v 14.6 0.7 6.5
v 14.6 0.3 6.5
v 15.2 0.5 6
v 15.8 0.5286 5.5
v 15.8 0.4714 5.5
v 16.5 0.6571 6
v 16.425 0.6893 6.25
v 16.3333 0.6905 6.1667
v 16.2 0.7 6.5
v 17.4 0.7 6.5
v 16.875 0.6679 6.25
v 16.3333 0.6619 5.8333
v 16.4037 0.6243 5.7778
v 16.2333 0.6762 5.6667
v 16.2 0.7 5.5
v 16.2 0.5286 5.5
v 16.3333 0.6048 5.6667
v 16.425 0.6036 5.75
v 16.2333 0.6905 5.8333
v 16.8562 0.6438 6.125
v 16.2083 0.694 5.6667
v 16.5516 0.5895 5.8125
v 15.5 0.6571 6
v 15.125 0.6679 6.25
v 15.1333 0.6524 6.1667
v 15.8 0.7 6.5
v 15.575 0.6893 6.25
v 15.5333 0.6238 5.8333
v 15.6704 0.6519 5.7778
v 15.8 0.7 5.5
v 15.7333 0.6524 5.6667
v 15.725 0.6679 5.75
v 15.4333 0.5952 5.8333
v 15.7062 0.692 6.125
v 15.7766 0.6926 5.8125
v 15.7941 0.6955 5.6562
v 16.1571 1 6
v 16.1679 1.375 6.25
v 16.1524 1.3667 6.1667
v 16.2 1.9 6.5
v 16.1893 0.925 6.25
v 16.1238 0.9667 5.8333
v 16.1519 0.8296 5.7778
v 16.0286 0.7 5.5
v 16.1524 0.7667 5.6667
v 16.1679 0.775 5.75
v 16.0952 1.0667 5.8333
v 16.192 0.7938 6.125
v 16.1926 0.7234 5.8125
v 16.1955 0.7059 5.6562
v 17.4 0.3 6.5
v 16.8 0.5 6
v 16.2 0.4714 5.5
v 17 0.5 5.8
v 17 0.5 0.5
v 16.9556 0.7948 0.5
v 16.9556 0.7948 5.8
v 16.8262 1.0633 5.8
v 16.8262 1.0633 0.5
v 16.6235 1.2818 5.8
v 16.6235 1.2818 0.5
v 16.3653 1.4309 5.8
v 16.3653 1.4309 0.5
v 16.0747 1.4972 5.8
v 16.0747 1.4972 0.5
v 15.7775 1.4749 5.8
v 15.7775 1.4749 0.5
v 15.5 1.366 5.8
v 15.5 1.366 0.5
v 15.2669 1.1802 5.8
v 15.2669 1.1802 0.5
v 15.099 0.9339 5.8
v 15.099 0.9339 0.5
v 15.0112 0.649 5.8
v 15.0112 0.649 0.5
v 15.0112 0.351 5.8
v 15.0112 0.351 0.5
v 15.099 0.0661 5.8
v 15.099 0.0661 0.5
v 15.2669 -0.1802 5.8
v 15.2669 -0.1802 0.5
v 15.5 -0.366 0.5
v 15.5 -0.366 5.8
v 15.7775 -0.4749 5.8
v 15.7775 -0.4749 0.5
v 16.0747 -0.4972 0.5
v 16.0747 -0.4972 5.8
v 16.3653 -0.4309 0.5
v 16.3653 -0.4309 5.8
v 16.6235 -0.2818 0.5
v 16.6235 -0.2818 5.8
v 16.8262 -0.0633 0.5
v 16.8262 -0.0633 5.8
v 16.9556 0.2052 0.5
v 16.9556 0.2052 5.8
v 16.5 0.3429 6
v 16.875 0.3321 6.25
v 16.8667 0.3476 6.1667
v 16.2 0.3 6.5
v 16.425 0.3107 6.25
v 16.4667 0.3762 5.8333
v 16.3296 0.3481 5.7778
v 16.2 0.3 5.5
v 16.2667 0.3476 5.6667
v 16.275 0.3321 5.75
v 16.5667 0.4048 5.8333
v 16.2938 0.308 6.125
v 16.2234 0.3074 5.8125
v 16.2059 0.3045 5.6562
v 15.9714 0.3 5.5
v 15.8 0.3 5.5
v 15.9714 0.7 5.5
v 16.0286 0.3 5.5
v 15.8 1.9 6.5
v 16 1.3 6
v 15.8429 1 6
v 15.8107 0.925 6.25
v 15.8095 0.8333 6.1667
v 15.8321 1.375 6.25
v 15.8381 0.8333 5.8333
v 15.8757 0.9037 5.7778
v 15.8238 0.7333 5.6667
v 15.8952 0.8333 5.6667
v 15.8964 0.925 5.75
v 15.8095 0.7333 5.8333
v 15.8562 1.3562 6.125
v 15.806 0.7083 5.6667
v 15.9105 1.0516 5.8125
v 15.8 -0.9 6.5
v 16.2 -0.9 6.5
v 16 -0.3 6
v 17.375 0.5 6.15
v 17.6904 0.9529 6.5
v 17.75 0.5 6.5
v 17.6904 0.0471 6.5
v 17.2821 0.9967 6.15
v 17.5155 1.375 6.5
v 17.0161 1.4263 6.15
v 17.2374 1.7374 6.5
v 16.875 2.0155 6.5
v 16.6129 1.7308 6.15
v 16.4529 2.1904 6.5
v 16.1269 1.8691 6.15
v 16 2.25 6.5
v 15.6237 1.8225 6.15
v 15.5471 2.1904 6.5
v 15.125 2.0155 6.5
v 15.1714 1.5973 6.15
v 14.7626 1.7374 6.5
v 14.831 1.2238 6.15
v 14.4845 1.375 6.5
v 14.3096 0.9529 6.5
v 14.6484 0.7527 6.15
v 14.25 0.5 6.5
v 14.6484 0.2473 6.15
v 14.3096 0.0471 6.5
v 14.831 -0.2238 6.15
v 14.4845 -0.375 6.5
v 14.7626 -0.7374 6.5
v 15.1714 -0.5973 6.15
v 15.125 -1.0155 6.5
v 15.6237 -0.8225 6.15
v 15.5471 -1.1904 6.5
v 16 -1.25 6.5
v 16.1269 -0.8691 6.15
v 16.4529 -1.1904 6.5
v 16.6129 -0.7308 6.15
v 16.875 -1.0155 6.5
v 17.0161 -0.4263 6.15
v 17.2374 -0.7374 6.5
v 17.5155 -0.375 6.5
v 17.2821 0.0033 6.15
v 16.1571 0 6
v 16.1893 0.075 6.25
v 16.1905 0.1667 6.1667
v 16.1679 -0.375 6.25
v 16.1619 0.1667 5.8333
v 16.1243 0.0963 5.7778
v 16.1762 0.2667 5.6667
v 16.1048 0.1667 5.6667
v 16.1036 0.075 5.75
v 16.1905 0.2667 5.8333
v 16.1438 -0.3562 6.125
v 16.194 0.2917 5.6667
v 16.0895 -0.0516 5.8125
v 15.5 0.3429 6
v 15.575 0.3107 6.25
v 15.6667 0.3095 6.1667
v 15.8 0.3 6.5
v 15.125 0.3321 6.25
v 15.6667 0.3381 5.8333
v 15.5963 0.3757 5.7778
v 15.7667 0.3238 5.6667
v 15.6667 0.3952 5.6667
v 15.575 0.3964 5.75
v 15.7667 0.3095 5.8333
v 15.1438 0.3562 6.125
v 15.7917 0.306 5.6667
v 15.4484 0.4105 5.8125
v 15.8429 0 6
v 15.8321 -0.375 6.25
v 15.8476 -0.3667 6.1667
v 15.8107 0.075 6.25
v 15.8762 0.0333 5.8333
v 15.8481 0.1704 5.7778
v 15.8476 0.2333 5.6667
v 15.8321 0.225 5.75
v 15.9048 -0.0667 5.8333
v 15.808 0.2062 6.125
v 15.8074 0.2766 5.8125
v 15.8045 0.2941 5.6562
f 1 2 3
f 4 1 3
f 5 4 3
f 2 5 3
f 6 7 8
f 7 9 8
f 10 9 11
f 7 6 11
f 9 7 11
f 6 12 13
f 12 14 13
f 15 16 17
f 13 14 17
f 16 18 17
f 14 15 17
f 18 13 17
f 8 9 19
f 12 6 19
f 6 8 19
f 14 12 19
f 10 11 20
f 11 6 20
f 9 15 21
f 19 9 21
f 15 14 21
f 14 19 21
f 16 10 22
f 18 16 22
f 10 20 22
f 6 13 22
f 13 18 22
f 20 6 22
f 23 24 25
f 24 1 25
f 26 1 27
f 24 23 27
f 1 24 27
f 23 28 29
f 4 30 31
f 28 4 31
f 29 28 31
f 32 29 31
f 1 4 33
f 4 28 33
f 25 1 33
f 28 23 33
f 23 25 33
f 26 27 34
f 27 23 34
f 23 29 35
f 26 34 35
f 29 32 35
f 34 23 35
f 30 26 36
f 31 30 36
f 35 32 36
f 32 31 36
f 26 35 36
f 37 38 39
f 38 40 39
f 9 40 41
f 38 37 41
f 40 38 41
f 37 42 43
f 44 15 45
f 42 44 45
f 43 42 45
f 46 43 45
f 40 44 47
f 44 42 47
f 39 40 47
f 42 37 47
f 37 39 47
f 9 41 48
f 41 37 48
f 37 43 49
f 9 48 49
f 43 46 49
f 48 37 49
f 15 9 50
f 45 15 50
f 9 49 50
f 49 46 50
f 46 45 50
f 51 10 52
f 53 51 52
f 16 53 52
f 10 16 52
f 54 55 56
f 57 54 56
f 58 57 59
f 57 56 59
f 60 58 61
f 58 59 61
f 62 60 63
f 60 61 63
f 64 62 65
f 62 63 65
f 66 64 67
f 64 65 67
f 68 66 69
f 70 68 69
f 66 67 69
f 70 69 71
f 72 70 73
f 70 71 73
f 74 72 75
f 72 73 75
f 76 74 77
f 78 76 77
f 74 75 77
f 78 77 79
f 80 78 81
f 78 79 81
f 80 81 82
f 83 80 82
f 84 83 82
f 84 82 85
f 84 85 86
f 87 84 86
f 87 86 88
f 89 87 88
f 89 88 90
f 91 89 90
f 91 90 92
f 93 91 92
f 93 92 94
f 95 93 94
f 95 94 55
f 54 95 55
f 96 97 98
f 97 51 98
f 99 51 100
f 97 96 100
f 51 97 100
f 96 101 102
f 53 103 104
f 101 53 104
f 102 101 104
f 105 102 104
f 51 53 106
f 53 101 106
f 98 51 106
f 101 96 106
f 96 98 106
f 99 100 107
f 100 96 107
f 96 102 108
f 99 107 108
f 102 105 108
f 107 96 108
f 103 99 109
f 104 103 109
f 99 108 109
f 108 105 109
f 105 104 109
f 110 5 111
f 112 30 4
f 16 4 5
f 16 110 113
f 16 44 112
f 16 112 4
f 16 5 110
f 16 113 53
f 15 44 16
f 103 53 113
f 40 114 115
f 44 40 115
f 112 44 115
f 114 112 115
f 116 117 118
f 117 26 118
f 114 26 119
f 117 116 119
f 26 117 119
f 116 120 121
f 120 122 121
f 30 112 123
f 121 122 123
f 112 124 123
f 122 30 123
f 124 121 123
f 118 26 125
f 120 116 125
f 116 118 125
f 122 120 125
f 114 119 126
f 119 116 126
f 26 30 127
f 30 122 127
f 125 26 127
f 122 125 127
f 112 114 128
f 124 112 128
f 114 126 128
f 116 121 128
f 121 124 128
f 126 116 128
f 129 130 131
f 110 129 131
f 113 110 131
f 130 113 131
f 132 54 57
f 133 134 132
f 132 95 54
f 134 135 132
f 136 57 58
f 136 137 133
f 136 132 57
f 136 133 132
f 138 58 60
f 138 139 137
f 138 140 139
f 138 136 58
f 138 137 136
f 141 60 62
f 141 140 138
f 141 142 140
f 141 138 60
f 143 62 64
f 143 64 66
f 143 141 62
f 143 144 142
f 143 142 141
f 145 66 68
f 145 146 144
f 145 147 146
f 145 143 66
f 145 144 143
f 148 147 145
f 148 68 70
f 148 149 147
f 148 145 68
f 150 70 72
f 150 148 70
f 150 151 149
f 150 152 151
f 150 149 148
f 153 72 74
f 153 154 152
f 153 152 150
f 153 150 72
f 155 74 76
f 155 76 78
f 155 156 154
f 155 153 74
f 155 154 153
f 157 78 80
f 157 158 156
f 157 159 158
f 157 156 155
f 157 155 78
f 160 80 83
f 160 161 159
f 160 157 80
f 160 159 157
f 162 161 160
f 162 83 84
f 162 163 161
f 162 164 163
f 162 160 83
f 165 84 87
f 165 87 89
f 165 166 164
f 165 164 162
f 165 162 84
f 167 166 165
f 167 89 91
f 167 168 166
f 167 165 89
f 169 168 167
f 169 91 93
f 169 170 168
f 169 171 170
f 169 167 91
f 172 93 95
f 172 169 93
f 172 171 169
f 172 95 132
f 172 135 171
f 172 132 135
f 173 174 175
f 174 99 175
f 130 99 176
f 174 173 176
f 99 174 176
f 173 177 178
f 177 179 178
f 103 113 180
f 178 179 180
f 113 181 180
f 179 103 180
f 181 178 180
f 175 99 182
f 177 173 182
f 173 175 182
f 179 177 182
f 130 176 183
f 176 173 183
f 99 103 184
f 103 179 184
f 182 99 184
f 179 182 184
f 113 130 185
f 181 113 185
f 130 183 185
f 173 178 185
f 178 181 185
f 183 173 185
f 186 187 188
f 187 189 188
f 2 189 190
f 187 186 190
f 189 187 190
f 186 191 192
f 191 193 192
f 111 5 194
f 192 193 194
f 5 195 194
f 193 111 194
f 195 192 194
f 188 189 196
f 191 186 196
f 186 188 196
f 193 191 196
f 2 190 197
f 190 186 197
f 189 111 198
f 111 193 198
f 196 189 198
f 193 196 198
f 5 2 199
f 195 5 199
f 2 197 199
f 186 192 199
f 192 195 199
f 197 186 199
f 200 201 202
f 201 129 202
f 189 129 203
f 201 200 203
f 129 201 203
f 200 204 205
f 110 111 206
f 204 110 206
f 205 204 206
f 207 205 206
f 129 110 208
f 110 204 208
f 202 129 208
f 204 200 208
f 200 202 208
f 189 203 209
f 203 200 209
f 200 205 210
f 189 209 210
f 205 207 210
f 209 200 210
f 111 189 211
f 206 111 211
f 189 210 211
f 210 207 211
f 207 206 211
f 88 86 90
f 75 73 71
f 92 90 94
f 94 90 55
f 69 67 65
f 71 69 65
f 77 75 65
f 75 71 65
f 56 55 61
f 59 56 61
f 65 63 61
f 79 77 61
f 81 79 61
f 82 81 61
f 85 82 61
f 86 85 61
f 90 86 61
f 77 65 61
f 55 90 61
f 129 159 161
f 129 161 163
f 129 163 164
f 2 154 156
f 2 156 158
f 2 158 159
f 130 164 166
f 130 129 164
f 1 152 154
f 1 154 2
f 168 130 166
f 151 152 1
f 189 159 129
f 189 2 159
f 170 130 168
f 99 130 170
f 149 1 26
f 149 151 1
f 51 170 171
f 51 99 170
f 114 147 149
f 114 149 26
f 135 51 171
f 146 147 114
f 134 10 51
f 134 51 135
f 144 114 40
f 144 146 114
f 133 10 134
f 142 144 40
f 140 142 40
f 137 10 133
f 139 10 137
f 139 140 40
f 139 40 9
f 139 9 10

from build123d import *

# Parameters (mm, degrees)
CYLINDER022_R     = 1
CYLINDER022_DEPTH = 5.5
SKETCH009_W       = 0.4
SKETCH009_H       = 0.4


with BuildPart() as part:
    # Cylinder022 → Cylinder022 (join)
    with BuildSketch(Plane.XY.offset(4)):
        Circle(CYLINDER022_R)
    extrude(amount=CYLINDER022_DEPTH)

    # Cone002 → Cone002 (revolve)
    with BuildSketch(Plane(origin=(0, 0, 9.3), x_dir=(1, 0, 0), z_dir=(0, -1, 0))):
        Polygon((0, 0), (1, 0), (1.75, 0.7), (0, 0.7), align=None)
    revolve(axis=Axis((0, 0, 9.3), (0, 0, 1)))

    # Sketch008 (on Face4 of Cone002) → SubtractiveLoft section 0
    with BuildSketch(Plane.XY.offset(10)):
        Polygon((-0.2, 0.2), (-0.2, 1.4), (0.2, 1.4), (0.2, 0.2), (1.4, 0.2), (1.4, -0.2), (0.2, -0.2), (0.2, -1.4), (-0.2, -1.4), (-0.2, -0.2), (-1.4, -0.2), (-1.4, 0.2), align=None)
    # Sketch009 (on Face4 of Cone002) → SubtractiveLoft section 1
    with BuildSketch(Plane.XY.offset(9)):
        Rectangle(SKETCH009_W, SKETCH009_H)
    loft(mode=Mode.SUBTRACT)


with BuildPart() as part_1:
    # Body010 placement: moved
    add(part.part.moved(Location((16, 0.5, -3.5))))


solid = part_1.part
